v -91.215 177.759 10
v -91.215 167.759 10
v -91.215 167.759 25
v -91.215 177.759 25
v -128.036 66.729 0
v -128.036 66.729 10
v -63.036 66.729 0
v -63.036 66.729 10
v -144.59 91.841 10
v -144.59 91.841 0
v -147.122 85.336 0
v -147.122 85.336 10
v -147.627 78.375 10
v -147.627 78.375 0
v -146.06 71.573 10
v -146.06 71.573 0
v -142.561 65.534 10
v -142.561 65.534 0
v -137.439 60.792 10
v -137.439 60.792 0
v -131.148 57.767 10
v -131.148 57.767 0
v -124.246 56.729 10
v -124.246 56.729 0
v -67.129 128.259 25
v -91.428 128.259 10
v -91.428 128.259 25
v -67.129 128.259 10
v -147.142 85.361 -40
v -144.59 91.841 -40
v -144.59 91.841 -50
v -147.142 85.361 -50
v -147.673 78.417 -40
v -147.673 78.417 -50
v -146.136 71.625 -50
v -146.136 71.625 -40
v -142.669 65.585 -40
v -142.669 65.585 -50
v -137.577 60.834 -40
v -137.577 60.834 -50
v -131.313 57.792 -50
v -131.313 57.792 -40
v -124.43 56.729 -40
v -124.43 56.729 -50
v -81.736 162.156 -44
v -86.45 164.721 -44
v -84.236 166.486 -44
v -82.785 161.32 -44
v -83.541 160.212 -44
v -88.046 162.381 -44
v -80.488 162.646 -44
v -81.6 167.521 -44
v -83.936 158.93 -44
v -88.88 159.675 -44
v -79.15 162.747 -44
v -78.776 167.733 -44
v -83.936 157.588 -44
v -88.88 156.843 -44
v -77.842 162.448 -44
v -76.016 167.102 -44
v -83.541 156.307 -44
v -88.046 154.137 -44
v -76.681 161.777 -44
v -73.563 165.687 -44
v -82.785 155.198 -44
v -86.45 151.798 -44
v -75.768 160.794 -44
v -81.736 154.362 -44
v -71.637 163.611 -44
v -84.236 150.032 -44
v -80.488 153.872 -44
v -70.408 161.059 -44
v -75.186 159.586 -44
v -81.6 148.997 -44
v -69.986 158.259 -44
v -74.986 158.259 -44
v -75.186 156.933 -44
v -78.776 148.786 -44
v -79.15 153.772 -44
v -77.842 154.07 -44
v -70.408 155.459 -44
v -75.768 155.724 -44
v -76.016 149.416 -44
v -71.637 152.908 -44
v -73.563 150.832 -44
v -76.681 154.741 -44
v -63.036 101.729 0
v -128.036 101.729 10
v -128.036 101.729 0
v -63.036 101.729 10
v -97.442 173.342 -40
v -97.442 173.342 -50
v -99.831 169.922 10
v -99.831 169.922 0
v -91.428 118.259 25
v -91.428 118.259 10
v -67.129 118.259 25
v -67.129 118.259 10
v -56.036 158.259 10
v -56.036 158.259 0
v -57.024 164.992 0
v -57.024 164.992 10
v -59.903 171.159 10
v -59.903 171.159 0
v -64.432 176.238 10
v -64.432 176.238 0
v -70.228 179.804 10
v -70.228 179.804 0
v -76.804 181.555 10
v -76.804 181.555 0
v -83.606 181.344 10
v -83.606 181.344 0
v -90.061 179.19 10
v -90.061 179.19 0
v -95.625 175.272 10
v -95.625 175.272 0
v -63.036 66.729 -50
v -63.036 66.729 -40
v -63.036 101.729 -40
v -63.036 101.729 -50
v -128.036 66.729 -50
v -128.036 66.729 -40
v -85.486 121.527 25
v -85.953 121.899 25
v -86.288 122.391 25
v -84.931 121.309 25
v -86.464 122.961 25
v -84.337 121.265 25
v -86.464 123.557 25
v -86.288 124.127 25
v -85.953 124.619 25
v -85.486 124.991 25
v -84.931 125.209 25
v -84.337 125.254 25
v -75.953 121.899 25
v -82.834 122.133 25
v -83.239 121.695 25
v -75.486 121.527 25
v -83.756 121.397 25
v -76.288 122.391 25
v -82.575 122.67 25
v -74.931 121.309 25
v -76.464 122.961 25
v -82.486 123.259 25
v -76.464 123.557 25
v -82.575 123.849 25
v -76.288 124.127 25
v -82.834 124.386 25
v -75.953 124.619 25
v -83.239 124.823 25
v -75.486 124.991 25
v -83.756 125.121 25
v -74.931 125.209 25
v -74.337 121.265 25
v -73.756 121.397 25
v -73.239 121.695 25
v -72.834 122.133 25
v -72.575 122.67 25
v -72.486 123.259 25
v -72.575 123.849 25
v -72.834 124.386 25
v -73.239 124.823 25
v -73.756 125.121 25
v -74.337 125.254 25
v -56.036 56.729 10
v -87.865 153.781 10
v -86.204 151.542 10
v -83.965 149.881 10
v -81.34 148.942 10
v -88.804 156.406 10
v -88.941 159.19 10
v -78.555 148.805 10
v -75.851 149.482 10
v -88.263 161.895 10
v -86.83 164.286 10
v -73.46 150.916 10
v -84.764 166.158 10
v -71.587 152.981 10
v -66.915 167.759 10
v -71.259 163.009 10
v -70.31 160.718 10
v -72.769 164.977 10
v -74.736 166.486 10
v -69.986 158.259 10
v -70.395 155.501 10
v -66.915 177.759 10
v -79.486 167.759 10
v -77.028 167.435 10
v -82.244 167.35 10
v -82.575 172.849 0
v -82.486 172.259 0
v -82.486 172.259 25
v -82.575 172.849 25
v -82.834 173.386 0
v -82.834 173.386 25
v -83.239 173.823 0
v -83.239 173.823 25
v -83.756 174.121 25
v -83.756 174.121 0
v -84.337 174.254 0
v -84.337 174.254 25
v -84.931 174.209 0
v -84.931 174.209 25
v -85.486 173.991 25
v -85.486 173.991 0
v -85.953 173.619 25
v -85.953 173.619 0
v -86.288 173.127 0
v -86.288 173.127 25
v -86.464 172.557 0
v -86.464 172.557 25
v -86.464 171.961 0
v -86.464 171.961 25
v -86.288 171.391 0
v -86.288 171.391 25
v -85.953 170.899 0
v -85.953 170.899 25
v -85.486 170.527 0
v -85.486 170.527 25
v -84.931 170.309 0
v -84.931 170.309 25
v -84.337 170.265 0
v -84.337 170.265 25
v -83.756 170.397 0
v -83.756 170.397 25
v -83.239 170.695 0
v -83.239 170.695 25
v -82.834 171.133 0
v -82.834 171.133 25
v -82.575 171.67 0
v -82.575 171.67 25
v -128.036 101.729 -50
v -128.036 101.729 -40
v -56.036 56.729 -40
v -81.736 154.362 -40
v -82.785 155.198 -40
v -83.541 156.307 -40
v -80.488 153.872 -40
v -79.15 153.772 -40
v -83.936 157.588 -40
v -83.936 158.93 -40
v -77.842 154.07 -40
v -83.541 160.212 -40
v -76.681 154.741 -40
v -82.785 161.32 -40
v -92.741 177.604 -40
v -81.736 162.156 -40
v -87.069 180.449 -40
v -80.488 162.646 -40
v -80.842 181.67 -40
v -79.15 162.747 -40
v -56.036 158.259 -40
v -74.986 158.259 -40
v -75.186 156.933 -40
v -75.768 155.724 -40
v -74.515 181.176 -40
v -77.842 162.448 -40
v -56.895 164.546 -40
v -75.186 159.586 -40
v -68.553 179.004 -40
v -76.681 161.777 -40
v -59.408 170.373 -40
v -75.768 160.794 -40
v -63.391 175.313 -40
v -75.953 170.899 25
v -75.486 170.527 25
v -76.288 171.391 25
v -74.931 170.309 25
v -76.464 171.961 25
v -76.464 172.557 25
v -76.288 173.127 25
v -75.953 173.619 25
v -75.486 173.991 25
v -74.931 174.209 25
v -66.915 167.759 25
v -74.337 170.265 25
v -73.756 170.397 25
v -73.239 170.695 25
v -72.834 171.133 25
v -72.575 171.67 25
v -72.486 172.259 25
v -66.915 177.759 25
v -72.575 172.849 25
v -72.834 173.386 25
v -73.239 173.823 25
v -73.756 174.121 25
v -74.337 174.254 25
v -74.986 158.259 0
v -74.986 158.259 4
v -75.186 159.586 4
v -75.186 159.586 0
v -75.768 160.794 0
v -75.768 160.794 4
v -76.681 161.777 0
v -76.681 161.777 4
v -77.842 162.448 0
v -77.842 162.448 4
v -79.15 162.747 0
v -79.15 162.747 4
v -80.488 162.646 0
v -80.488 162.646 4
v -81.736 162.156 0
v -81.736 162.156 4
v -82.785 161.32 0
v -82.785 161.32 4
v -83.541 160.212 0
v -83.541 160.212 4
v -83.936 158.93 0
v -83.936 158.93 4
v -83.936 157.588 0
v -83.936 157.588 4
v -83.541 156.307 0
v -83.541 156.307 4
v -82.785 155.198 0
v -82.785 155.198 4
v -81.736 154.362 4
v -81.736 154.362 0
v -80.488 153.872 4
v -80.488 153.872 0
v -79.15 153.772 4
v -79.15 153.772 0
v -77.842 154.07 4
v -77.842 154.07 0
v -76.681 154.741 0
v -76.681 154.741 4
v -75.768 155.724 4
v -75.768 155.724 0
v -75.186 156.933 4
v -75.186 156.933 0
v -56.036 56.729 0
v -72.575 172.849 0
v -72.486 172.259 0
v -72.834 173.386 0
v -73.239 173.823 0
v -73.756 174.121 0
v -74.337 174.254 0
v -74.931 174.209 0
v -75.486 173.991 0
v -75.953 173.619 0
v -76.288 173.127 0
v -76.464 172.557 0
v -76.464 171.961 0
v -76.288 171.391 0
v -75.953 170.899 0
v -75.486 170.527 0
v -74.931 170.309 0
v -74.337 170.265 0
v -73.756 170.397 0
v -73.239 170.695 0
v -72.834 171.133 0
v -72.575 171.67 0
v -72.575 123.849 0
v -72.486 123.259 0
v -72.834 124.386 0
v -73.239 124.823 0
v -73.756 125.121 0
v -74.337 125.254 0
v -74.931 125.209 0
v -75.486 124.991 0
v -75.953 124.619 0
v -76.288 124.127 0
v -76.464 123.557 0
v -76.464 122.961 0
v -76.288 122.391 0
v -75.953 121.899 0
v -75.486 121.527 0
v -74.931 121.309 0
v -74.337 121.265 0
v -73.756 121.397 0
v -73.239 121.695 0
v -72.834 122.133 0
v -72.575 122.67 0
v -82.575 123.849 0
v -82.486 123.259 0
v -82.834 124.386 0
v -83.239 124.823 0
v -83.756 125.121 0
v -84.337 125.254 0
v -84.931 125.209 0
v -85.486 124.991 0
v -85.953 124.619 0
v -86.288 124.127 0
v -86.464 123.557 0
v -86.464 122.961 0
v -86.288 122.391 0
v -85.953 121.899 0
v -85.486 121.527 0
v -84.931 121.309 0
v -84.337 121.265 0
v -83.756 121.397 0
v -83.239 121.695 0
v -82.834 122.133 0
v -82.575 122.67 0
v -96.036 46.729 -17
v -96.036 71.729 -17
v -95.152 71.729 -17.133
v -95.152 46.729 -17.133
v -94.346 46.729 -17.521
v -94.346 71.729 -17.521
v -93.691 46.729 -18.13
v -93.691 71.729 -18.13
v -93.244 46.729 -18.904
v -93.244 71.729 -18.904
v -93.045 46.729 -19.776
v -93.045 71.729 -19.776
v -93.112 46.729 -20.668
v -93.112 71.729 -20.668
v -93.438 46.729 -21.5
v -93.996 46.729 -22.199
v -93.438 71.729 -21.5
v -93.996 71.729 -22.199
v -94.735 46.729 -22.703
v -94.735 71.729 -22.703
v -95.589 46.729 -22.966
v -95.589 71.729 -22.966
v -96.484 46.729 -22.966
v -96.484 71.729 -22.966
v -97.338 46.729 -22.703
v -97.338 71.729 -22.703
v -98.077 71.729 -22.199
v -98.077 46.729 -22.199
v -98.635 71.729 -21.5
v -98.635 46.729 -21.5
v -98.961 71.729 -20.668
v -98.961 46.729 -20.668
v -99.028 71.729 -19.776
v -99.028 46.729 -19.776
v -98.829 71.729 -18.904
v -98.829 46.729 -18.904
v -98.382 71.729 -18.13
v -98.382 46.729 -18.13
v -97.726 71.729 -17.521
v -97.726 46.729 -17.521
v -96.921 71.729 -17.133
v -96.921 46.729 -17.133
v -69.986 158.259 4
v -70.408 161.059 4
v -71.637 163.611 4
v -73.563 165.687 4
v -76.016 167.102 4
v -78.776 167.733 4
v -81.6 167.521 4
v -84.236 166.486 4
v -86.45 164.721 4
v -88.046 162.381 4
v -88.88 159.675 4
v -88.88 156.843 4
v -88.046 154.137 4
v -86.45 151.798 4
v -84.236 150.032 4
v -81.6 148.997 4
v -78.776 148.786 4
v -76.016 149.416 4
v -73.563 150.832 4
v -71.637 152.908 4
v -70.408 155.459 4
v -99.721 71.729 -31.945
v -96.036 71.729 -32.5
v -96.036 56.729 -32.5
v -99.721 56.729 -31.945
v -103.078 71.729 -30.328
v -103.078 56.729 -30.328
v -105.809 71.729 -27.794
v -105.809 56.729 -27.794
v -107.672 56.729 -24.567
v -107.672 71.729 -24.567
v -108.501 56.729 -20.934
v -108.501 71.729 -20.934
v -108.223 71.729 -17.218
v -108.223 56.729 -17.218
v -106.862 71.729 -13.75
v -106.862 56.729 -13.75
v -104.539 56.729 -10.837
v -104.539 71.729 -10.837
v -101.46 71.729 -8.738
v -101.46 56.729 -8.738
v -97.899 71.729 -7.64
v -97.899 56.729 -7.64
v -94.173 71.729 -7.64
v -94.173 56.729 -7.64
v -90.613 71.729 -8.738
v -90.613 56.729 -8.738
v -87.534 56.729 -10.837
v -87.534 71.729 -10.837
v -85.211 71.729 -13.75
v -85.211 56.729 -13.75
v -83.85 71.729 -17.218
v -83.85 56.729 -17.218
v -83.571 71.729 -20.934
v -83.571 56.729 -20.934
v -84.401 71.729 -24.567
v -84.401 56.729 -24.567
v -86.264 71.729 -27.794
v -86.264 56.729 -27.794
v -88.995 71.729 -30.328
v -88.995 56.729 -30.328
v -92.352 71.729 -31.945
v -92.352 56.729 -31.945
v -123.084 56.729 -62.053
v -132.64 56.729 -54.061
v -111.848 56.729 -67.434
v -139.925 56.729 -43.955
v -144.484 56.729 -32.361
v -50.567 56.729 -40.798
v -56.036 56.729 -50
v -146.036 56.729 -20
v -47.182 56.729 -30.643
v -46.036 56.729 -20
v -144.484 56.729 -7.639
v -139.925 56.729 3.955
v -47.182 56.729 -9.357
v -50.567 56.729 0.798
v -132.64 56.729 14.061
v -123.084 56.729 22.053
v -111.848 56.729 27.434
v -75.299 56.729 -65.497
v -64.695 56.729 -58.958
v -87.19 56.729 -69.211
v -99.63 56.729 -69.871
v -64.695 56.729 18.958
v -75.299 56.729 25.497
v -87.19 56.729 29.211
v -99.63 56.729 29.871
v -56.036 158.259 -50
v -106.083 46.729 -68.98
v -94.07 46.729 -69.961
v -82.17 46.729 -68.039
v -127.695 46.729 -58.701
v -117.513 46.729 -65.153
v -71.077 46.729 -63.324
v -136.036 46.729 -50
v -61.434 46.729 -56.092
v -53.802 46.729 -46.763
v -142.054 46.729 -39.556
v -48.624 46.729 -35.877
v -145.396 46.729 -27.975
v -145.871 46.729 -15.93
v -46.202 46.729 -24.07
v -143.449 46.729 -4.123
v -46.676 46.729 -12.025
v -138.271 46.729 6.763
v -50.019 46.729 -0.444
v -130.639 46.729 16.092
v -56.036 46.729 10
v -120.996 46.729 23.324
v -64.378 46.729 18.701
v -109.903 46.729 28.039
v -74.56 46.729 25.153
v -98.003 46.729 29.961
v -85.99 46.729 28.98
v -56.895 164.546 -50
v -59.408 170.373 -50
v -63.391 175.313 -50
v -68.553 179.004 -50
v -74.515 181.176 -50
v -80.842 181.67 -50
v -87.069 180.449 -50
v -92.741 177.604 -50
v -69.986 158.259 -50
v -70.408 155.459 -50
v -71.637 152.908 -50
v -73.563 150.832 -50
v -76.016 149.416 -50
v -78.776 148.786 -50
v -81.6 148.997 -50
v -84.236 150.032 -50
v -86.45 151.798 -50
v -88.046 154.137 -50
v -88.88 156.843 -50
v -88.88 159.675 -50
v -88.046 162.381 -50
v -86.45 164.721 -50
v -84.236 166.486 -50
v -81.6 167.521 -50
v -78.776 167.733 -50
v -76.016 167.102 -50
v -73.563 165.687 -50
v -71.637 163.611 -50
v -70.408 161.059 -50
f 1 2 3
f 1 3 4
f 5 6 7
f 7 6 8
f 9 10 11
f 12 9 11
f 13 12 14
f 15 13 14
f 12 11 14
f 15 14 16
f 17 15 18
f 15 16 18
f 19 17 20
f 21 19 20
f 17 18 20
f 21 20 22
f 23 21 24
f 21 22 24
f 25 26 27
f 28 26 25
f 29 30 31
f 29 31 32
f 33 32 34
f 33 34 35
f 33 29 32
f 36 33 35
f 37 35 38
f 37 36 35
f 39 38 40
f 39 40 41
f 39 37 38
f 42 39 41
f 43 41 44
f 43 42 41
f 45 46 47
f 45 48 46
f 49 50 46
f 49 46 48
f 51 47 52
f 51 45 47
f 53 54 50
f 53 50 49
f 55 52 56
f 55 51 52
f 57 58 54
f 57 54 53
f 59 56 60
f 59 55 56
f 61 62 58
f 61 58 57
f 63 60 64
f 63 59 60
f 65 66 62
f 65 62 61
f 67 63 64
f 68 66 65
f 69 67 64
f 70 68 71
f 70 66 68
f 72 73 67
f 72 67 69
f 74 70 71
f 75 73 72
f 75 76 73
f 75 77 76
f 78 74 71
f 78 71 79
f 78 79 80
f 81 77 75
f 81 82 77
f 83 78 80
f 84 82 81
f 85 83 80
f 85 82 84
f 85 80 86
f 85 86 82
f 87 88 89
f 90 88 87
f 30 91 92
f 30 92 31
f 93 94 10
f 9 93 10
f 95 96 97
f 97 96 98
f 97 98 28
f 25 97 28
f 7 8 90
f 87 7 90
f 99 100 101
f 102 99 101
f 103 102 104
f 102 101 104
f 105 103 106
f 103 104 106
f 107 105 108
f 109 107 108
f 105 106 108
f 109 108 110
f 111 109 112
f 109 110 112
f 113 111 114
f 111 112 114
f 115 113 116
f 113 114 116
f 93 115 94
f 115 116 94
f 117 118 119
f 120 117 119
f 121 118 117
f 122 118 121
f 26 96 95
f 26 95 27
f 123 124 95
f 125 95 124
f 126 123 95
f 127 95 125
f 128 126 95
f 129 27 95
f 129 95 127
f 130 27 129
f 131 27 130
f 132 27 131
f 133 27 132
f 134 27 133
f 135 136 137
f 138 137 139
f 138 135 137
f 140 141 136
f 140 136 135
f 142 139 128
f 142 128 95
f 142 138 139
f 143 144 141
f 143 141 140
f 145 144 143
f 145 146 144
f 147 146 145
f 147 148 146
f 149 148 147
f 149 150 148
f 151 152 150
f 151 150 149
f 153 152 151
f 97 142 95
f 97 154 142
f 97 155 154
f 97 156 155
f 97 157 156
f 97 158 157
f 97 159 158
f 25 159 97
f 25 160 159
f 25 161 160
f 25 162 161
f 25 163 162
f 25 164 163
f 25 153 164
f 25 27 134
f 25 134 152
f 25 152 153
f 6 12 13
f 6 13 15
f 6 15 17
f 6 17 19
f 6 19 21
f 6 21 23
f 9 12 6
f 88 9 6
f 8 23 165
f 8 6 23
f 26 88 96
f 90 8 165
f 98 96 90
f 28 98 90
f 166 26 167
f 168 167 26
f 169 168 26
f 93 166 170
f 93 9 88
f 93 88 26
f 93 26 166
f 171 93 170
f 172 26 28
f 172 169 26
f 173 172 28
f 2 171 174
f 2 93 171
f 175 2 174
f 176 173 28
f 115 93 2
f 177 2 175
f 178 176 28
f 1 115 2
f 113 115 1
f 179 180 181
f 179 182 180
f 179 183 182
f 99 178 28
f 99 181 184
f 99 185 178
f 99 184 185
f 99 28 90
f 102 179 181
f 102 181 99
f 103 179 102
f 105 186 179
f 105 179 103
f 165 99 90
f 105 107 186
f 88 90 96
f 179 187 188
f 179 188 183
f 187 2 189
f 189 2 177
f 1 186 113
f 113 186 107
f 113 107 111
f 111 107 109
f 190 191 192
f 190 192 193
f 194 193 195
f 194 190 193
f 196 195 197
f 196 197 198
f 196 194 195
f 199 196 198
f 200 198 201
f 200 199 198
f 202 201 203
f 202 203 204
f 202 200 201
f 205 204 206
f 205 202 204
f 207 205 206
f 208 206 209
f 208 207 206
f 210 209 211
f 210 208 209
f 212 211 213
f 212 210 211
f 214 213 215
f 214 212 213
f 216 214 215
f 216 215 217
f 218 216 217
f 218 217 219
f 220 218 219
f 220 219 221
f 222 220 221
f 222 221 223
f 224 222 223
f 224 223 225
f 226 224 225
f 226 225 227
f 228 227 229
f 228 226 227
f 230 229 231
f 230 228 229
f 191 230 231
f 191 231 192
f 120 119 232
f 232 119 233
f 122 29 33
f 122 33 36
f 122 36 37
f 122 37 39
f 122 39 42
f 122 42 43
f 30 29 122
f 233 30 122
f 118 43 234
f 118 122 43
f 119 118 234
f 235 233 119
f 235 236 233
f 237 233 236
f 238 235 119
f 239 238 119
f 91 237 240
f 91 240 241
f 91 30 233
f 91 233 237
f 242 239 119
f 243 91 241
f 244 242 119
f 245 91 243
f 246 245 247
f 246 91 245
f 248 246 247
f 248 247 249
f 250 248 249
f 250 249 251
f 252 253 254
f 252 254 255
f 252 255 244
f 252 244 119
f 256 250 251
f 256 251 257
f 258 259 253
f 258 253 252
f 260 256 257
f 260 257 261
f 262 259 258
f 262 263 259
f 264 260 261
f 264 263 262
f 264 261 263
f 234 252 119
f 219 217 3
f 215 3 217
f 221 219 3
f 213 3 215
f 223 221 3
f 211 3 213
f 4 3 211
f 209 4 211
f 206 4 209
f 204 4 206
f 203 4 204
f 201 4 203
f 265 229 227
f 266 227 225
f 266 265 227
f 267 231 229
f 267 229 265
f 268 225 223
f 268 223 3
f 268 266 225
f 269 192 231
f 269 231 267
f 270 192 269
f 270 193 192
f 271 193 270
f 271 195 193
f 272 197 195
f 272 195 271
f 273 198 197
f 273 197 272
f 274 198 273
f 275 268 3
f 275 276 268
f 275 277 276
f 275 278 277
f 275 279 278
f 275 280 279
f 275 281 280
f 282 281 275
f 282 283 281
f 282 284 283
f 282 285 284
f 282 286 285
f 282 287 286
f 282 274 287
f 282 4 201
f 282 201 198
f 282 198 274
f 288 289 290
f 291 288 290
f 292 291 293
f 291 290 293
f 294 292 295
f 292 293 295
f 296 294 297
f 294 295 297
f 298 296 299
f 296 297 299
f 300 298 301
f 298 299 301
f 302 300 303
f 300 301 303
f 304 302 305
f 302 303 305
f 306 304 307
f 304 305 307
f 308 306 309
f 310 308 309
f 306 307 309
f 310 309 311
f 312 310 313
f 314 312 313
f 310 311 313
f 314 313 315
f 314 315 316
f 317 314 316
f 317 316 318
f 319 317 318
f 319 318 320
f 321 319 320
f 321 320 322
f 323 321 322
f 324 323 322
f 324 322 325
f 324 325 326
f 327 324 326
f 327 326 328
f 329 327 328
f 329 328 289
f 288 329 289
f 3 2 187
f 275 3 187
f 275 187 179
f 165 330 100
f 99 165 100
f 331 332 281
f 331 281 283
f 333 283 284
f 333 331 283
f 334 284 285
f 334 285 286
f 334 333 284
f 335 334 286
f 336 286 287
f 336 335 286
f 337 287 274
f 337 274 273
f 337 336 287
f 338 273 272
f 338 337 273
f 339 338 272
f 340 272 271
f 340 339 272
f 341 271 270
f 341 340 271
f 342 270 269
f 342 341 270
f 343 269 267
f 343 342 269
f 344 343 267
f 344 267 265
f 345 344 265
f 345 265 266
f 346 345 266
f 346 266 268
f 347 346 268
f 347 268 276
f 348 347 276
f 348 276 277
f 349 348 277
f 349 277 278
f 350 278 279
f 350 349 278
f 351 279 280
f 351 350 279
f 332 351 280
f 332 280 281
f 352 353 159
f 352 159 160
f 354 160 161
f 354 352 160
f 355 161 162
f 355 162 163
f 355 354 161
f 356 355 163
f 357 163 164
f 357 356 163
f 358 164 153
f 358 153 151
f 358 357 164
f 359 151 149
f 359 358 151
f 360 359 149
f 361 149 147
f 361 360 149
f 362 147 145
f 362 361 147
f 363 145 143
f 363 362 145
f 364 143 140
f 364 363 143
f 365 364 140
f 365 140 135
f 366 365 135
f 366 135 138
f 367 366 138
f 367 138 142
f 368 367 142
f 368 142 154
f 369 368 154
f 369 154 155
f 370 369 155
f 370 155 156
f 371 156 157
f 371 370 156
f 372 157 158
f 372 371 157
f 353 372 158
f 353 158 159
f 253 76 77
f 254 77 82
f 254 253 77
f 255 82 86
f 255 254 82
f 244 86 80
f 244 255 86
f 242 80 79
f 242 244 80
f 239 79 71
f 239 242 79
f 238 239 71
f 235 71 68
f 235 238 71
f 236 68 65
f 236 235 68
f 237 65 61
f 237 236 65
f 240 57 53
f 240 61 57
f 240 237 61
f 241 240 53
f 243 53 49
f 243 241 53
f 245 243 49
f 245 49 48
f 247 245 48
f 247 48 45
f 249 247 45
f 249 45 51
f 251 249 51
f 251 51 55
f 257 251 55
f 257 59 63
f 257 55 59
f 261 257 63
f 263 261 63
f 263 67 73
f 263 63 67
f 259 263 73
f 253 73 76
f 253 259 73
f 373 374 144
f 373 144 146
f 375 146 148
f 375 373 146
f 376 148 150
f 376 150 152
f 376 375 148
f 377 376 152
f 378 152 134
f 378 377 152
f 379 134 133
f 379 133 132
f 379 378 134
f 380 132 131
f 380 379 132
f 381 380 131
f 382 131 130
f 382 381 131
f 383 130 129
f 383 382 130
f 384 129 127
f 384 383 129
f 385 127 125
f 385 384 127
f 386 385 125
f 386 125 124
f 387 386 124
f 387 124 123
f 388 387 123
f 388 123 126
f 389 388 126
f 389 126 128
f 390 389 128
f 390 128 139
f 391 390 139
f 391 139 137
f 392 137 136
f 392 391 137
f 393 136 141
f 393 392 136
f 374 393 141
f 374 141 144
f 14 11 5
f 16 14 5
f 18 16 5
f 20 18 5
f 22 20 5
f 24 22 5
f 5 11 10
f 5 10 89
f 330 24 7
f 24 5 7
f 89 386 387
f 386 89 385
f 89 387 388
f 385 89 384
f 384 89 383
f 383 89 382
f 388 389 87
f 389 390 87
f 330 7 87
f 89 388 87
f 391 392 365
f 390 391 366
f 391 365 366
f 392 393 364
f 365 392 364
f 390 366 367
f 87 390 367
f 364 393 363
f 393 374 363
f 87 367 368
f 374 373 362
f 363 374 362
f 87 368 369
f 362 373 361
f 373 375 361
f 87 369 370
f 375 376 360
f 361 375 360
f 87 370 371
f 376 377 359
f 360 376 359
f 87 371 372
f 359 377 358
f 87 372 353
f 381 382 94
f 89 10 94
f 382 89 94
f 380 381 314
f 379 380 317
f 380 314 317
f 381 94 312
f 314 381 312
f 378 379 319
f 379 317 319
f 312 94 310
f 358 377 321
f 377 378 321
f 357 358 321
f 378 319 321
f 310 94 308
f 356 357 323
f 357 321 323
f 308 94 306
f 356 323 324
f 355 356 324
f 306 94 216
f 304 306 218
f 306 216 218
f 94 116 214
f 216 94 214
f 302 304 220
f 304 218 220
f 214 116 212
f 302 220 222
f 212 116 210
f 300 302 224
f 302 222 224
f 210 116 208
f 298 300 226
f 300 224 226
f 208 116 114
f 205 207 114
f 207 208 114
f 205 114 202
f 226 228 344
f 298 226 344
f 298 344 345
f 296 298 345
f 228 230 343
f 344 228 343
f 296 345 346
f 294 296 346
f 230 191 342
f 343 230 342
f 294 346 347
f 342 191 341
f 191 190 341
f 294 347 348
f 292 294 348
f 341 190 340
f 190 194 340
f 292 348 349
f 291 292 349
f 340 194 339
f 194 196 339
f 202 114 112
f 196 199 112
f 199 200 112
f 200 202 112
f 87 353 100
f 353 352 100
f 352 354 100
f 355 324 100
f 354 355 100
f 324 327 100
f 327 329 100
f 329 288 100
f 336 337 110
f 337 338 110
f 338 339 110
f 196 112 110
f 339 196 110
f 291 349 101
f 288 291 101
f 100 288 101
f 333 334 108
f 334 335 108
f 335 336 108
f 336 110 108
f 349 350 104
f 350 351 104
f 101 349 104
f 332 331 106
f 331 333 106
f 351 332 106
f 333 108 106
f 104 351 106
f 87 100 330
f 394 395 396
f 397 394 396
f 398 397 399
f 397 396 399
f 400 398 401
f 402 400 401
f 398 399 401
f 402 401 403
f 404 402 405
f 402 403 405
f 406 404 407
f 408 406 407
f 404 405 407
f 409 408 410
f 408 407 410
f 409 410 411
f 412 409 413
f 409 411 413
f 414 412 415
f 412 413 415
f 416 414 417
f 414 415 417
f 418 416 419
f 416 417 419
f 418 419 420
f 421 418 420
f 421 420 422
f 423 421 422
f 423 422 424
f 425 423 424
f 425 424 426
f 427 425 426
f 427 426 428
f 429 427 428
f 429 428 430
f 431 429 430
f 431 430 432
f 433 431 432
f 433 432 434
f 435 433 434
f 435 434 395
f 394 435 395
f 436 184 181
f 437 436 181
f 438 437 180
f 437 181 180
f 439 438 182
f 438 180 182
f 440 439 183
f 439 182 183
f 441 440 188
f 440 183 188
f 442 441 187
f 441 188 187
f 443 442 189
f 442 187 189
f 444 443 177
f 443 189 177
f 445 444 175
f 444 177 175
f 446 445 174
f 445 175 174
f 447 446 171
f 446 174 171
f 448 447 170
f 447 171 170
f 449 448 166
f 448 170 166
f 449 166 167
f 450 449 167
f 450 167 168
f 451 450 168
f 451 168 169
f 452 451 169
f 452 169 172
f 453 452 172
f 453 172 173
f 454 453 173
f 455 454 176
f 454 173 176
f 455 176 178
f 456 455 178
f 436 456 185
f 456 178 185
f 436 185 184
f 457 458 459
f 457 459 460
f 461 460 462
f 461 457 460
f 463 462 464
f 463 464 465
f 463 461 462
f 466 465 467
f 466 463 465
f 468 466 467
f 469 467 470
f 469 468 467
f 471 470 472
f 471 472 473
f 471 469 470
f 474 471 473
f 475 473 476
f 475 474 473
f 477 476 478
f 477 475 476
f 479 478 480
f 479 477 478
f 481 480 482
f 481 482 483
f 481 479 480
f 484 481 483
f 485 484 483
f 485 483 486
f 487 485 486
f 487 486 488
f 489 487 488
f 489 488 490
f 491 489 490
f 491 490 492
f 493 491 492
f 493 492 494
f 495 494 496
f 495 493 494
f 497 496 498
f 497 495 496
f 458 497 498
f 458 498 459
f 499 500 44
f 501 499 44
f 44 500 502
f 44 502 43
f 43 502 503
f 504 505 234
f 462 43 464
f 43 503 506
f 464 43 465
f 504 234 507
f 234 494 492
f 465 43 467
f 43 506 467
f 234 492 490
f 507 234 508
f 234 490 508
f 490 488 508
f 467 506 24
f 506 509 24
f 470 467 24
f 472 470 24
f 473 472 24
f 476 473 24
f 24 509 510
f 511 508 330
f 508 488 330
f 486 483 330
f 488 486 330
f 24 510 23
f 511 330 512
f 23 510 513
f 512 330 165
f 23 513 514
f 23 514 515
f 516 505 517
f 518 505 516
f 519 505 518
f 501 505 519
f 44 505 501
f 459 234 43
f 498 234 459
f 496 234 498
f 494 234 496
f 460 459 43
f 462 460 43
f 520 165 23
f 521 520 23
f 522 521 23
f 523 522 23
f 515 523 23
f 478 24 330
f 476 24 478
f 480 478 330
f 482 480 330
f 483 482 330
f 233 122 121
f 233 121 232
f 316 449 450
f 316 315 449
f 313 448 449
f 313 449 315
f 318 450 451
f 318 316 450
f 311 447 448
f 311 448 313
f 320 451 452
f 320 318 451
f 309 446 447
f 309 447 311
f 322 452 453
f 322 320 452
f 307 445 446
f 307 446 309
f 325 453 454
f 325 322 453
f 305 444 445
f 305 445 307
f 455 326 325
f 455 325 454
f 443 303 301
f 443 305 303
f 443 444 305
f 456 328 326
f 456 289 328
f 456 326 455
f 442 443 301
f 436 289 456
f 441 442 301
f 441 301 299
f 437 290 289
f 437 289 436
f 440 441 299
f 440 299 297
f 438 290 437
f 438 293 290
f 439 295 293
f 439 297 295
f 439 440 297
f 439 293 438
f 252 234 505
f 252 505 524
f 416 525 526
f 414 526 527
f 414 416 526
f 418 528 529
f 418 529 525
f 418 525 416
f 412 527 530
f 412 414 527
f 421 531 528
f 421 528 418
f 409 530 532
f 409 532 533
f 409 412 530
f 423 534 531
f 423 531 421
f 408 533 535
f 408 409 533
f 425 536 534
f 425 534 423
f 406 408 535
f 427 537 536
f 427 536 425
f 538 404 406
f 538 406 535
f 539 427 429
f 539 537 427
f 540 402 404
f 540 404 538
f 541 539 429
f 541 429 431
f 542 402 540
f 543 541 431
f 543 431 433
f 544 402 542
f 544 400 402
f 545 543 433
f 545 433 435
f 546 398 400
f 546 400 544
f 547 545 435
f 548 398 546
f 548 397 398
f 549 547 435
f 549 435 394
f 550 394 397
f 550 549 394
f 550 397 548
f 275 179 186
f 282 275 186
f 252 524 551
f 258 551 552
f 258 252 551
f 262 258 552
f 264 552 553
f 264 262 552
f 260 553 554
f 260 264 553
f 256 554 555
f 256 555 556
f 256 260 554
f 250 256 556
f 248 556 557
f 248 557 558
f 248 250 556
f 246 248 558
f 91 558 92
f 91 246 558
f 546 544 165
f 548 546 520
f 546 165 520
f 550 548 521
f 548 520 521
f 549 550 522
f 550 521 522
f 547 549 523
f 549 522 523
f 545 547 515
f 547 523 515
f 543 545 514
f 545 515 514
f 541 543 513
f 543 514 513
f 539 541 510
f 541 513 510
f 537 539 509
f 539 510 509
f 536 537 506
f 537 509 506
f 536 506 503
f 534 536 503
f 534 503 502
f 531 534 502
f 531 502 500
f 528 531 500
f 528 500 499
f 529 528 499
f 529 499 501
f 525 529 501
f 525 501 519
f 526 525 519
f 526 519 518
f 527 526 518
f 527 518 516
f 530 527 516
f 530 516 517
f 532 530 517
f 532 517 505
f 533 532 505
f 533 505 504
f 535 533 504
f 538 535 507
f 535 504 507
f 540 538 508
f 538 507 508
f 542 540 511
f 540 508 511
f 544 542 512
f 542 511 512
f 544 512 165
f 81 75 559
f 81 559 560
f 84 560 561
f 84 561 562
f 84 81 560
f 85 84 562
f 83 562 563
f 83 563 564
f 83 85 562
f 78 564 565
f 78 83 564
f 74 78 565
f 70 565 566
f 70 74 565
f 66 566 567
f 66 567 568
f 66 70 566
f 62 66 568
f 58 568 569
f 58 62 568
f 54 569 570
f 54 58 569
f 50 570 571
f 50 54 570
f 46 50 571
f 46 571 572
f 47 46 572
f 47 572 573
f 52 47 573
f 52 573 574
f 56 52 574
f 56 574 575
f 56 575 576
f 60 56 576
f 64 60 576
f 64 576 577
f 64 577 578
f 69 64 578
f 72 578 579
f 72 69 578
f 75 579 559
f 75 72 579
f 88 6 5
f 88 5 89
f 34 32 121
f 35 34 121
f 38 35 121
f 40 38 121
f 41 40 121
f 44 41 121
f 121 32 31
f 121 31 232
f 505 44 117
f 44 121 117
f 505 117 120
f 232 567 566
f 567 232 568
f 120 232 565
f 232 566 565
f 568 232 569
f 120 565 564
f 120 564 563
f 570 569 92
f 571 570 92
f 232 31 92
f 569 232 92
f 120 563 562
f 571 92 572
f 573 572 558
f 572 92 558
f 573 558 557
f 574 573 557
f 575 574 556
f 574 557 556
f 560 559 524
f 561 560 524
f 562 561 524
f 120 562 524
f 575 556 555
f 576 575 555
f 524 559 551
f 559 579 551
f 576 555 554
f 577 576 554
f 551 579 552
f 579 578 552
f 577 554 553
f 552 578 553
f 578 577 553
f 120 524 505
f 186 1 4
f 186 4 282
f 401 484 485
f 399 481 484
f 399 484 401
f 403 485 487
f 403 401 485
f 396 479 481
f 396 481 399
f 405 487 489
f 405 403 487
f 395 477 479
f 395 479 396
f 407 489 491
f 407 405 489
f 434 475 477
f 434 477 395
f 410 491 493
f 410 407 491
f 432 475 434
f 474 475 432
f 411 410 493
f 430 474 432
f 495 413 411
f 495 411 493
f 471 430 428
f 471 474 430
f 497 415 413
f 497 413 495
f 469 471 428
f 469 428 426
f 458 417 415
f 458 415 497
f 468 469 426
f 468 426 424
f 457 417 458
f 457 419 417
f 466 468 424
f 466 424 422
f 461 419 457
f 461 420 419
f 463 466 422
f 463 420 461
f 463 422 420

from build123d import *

# Parameters (mm, degrees)
BOSS_EXTRUDE2_DEPTH     = 10
CUT_EXTRUDE2_REACH      = 236.376
SKETCH2_R               = 4.5
SKETCH3_R               = 9.5
CUT_EXTRUDE3_DEPTH      = 6
SKETCH6_W               = 24.299182762
SKETCH6_H               = 10
SKETCH6_W_2             = 24.299182761
BOSS_EXTRUDE7_DEPTH     = 15
CUT_EXTRUDE5_DEPTH      = 15
CUT_EXTRUDE5_DEPTH_BACK = 10
SKETCH5_R               = 2
SKETCH10_W              = 65
SKETCH10_H              = 35
CUT_EXTRUDE6_DEPTH      = 235.64297264
SKETCH11_R              = 4.5
SKETCH11_W              = 65
SKETCH11_H              = 35
BOSS_EXTRUDE8_DEPTH     = 10
SKETCH12_R              = 50
BOSS_EXTRUDE9_DEPTH     = 10
SKETCH13_R              = 3
CUT_EXTRUDE7_DEPTH      = 10
BOSS_EXTRUDE10_START    = 15
SKETCH14_R              = 12.5
SKETCH14_R_2            = 3
BOSS_EXTRUDE10_DEPTH    = 15
CUT_EXTRUDE8_START      = -6
SKETCH15_R              = 9.5
CUT_EXTRUDE8_DEPTH      = 6


with BuildPart() as part:
    # Sketch1 → Boss-Extrude2 (new body)
    with BuildSketch(Plane.XY):
        with BuildLine():
            Line((-99.83076192, 169.92150388), (-144.590341361, 91.840904188))
            ThreePointArc((-144.590341361, 91.840904188), (-144.536211539, 68.422267368), (-124.24600733, 56.7285471))
            Line((-124.24600733, 56.7285471), (-79.486427889, 56.7285471))
            Line((-79.486427889, 56.7285471), (-79.24600733, 56.7285471))
            Line((-79.24600733, 56.7285471), (-56.036427889, 56.7285471))
            Line((-56.036427889, 56.7285471), (-56.036427889, 158.259146792))
            ThreePointArc((-56.036427889, 158.259146792), (-73.452032021, 180.919432901), (-99.83076192, 169.92150388))
        make_face()
    extrude(amount=BOSS_EXTRUDE2_DEPTH)

    # Sketch2 → Cut-Extrude2 (cut, up to next)
    with BuildSketch(Plane.XY.offset(10), mode=Mode.PRIVATE) as cut_extrude2_sk1:
        with Locations((-79.486427889, 158.259146792)):
            Circle(SKETCH2_R)
    cut_extrude2_tool1 = extrude(cut_extrude2_sk1.sketch, amount=-CUT_EXTRUDE2_REACH, mode=Mode.PRIVATE) & part.part
    add(cut_extrude2_tool1.solids().sort_by_distance((-79.486428, 158.259147, 10))[0], mode=Mode.SUBTRACT)

    # Sketch3 → Cut-Extrude3 (cut)
    with BuildSketch(Plane.XY.offset(10)):
        with Locations((-79.486427889, 158.259146792)):
            Circle(SKETCH3_R)
    extrude(amount=-CUT_EXTRUDE3_DEPTH, mode=Mode.SUBTRACT)

    # Sketch6 → Boss-Extrude7 (add)
    with BuildSketch(Plane.XY.offset(10)):
        with Locations((-79.278789724, 123.259146792)):
            Rectangle(SKETCH6_W, SKETCH6_H)
        with Locations((-79.064929675, 172.759146792)):
            Rectangle(SKETCH6_W_2, SKETCH6_H)
    extrude(amount=BOSS_EXTRUDE7_DEPTH)

    # Sketch5 → Cut-Extrude5 (cut, two sides: drawn at the far end of the back side and taken through both)
    with BuildSketch(Plane.XY.offset(10).offset(-CUT_EXTRUDE5_DEPTH_BACK)):
        with Locations((-84.486427889, 172.259146792)):
            Circle(SKETCH5_R)
        with Locations((-74.486427889, 172.259146792)):
            Circle(SKETCH5_R)
        with Locations((-84.486427889, 123.259146792)):
            Circle(SKETCH5_R)
        with Locations((-74.486427889, 123.259146792)):
            Circle(SKETCH5_R)
    extrude(amount=CUT_EXTRUDE5_DEPTH + CUT_EXTRUDE5_DEPTH_BACK, mode=Mode.SUBTRACT)

    # Sketch10 → Cut-Extrude6 (cut, through all)
    with BuildSketch(Plane.XY.offset(10)):
        with Locations((-95.536427889, 84.2285471)):
            Rectangle(SKETCH10_W, SKETCH10_H)
    extrude(amount=-CUT_EXTRUDE6_DEPTH, mode=Mode.SUBTRACT)



with BuildPart() as body_2:
    # Sketch11 → Boss-Extrude8 (new body)
    with BuildSketch(Plane(origin=(0, 0, -40), x_dir=(-1, 0, 0), z_dir=(0, 0, -1))):
        with BuildLine():
            Line((56.036427889, 56.7285471), (56.036427889, 158.259146792))
            ThreePointArc((56.036427889, 158.259146792), (71.460186532, 180.292801725), (97.442137883, 173.342083462))
            Line((97.442137883, 173.342083462), (144.590341361, 91.840904188))
            ThreePointArc((144.590341361, 91.840904188), (144.582356287, 68.395530793), (124.24600733, 56.7285471))
            Line((124.24600733, 56.7285471), (56.036427889, 56.7285471))
        make_face()
        with Locations(Location((79.486427889, 158.259146792, 0), (0, 0, 180))):
            Circle(SKETCH11_R, mode=Mode.SUBTRACT)
        with Locations((95.536427889, 84.2285471)):
            Rectangle(SKETCH11_W, SKETCH11_H, mode=Mode.SUBTRACT)
    extrude(amount=BOSS_EXTRUDE8_DEPTH)


with BuildPart() as part_1:
    add(part.part)

    add(body_2.part)  # Boss-Extrude9 merges body 2
    # Sketch12 → Boss-Extrude9 (add)
    with BuildSketch(Plane.XZ.offset(-56.7285471)):
        with Locations(Location((-96.036427889, -20, 0), (0, 0, 36.869897646))):
            Circle(SKETCH12_R)
    extrude(amount=BOSS_EXTRUDE9_DEPTH)

    # Sketch13 → Cut-Extrude7 (cut)
    with BuildSketch(Plane(origin=(0, 56.7285471, 0), x_dir=(1, 0, 0), z_dir=(0, 1, 0))):
        with Locations(Location((-96.036427889, 20, 0), (0, 0, 270))):
            Circle(SKETCH13_R)
    extrude(amount=-CUT_EXTRUDE7_DEPTH, mode=Mode.SUBTRACT)

    # Sketch14 → Boss-Extrude10 (add)
    with BuildSketch(Plane(origin=(0, 56.7285471, 0), x_dir=(1, 0, 0), z_dir=(0, 1, 0)).offset(BOSS_EXTRUDE10_START)):
        with Locations(Location((-96.036427889, 20, 0), (0, 0, 90))):
            Circle(SKETCH14_R)
        with Locations(Location((-96.036427889, 20, 0), (0, 0, 270))):
            Circle(SKETCH14_R_2, mode=Mode.SUBTRACT)
    extrude(amount=-BOSS_EXTRUDE10_DEPTH)

    # Sketch15 → Cut-Extrude8 (cut)
    with BuildSketch(Plane(origin=(0, 0, -50), x_dir=(-1, 0, 0), z_dir=(0, 0, -1)).offset(CUT_EXTRUDE8_START)):
        with Locations(Location((79.486427889, 158.259146792, 0), (0, 0, 180))):
            Circle(SKETCH15_R)
    extrude(amount=CUT_EXTRUDE8_DEPTH, mode=Mode.SUBTRACT)


solid = part_1.part
